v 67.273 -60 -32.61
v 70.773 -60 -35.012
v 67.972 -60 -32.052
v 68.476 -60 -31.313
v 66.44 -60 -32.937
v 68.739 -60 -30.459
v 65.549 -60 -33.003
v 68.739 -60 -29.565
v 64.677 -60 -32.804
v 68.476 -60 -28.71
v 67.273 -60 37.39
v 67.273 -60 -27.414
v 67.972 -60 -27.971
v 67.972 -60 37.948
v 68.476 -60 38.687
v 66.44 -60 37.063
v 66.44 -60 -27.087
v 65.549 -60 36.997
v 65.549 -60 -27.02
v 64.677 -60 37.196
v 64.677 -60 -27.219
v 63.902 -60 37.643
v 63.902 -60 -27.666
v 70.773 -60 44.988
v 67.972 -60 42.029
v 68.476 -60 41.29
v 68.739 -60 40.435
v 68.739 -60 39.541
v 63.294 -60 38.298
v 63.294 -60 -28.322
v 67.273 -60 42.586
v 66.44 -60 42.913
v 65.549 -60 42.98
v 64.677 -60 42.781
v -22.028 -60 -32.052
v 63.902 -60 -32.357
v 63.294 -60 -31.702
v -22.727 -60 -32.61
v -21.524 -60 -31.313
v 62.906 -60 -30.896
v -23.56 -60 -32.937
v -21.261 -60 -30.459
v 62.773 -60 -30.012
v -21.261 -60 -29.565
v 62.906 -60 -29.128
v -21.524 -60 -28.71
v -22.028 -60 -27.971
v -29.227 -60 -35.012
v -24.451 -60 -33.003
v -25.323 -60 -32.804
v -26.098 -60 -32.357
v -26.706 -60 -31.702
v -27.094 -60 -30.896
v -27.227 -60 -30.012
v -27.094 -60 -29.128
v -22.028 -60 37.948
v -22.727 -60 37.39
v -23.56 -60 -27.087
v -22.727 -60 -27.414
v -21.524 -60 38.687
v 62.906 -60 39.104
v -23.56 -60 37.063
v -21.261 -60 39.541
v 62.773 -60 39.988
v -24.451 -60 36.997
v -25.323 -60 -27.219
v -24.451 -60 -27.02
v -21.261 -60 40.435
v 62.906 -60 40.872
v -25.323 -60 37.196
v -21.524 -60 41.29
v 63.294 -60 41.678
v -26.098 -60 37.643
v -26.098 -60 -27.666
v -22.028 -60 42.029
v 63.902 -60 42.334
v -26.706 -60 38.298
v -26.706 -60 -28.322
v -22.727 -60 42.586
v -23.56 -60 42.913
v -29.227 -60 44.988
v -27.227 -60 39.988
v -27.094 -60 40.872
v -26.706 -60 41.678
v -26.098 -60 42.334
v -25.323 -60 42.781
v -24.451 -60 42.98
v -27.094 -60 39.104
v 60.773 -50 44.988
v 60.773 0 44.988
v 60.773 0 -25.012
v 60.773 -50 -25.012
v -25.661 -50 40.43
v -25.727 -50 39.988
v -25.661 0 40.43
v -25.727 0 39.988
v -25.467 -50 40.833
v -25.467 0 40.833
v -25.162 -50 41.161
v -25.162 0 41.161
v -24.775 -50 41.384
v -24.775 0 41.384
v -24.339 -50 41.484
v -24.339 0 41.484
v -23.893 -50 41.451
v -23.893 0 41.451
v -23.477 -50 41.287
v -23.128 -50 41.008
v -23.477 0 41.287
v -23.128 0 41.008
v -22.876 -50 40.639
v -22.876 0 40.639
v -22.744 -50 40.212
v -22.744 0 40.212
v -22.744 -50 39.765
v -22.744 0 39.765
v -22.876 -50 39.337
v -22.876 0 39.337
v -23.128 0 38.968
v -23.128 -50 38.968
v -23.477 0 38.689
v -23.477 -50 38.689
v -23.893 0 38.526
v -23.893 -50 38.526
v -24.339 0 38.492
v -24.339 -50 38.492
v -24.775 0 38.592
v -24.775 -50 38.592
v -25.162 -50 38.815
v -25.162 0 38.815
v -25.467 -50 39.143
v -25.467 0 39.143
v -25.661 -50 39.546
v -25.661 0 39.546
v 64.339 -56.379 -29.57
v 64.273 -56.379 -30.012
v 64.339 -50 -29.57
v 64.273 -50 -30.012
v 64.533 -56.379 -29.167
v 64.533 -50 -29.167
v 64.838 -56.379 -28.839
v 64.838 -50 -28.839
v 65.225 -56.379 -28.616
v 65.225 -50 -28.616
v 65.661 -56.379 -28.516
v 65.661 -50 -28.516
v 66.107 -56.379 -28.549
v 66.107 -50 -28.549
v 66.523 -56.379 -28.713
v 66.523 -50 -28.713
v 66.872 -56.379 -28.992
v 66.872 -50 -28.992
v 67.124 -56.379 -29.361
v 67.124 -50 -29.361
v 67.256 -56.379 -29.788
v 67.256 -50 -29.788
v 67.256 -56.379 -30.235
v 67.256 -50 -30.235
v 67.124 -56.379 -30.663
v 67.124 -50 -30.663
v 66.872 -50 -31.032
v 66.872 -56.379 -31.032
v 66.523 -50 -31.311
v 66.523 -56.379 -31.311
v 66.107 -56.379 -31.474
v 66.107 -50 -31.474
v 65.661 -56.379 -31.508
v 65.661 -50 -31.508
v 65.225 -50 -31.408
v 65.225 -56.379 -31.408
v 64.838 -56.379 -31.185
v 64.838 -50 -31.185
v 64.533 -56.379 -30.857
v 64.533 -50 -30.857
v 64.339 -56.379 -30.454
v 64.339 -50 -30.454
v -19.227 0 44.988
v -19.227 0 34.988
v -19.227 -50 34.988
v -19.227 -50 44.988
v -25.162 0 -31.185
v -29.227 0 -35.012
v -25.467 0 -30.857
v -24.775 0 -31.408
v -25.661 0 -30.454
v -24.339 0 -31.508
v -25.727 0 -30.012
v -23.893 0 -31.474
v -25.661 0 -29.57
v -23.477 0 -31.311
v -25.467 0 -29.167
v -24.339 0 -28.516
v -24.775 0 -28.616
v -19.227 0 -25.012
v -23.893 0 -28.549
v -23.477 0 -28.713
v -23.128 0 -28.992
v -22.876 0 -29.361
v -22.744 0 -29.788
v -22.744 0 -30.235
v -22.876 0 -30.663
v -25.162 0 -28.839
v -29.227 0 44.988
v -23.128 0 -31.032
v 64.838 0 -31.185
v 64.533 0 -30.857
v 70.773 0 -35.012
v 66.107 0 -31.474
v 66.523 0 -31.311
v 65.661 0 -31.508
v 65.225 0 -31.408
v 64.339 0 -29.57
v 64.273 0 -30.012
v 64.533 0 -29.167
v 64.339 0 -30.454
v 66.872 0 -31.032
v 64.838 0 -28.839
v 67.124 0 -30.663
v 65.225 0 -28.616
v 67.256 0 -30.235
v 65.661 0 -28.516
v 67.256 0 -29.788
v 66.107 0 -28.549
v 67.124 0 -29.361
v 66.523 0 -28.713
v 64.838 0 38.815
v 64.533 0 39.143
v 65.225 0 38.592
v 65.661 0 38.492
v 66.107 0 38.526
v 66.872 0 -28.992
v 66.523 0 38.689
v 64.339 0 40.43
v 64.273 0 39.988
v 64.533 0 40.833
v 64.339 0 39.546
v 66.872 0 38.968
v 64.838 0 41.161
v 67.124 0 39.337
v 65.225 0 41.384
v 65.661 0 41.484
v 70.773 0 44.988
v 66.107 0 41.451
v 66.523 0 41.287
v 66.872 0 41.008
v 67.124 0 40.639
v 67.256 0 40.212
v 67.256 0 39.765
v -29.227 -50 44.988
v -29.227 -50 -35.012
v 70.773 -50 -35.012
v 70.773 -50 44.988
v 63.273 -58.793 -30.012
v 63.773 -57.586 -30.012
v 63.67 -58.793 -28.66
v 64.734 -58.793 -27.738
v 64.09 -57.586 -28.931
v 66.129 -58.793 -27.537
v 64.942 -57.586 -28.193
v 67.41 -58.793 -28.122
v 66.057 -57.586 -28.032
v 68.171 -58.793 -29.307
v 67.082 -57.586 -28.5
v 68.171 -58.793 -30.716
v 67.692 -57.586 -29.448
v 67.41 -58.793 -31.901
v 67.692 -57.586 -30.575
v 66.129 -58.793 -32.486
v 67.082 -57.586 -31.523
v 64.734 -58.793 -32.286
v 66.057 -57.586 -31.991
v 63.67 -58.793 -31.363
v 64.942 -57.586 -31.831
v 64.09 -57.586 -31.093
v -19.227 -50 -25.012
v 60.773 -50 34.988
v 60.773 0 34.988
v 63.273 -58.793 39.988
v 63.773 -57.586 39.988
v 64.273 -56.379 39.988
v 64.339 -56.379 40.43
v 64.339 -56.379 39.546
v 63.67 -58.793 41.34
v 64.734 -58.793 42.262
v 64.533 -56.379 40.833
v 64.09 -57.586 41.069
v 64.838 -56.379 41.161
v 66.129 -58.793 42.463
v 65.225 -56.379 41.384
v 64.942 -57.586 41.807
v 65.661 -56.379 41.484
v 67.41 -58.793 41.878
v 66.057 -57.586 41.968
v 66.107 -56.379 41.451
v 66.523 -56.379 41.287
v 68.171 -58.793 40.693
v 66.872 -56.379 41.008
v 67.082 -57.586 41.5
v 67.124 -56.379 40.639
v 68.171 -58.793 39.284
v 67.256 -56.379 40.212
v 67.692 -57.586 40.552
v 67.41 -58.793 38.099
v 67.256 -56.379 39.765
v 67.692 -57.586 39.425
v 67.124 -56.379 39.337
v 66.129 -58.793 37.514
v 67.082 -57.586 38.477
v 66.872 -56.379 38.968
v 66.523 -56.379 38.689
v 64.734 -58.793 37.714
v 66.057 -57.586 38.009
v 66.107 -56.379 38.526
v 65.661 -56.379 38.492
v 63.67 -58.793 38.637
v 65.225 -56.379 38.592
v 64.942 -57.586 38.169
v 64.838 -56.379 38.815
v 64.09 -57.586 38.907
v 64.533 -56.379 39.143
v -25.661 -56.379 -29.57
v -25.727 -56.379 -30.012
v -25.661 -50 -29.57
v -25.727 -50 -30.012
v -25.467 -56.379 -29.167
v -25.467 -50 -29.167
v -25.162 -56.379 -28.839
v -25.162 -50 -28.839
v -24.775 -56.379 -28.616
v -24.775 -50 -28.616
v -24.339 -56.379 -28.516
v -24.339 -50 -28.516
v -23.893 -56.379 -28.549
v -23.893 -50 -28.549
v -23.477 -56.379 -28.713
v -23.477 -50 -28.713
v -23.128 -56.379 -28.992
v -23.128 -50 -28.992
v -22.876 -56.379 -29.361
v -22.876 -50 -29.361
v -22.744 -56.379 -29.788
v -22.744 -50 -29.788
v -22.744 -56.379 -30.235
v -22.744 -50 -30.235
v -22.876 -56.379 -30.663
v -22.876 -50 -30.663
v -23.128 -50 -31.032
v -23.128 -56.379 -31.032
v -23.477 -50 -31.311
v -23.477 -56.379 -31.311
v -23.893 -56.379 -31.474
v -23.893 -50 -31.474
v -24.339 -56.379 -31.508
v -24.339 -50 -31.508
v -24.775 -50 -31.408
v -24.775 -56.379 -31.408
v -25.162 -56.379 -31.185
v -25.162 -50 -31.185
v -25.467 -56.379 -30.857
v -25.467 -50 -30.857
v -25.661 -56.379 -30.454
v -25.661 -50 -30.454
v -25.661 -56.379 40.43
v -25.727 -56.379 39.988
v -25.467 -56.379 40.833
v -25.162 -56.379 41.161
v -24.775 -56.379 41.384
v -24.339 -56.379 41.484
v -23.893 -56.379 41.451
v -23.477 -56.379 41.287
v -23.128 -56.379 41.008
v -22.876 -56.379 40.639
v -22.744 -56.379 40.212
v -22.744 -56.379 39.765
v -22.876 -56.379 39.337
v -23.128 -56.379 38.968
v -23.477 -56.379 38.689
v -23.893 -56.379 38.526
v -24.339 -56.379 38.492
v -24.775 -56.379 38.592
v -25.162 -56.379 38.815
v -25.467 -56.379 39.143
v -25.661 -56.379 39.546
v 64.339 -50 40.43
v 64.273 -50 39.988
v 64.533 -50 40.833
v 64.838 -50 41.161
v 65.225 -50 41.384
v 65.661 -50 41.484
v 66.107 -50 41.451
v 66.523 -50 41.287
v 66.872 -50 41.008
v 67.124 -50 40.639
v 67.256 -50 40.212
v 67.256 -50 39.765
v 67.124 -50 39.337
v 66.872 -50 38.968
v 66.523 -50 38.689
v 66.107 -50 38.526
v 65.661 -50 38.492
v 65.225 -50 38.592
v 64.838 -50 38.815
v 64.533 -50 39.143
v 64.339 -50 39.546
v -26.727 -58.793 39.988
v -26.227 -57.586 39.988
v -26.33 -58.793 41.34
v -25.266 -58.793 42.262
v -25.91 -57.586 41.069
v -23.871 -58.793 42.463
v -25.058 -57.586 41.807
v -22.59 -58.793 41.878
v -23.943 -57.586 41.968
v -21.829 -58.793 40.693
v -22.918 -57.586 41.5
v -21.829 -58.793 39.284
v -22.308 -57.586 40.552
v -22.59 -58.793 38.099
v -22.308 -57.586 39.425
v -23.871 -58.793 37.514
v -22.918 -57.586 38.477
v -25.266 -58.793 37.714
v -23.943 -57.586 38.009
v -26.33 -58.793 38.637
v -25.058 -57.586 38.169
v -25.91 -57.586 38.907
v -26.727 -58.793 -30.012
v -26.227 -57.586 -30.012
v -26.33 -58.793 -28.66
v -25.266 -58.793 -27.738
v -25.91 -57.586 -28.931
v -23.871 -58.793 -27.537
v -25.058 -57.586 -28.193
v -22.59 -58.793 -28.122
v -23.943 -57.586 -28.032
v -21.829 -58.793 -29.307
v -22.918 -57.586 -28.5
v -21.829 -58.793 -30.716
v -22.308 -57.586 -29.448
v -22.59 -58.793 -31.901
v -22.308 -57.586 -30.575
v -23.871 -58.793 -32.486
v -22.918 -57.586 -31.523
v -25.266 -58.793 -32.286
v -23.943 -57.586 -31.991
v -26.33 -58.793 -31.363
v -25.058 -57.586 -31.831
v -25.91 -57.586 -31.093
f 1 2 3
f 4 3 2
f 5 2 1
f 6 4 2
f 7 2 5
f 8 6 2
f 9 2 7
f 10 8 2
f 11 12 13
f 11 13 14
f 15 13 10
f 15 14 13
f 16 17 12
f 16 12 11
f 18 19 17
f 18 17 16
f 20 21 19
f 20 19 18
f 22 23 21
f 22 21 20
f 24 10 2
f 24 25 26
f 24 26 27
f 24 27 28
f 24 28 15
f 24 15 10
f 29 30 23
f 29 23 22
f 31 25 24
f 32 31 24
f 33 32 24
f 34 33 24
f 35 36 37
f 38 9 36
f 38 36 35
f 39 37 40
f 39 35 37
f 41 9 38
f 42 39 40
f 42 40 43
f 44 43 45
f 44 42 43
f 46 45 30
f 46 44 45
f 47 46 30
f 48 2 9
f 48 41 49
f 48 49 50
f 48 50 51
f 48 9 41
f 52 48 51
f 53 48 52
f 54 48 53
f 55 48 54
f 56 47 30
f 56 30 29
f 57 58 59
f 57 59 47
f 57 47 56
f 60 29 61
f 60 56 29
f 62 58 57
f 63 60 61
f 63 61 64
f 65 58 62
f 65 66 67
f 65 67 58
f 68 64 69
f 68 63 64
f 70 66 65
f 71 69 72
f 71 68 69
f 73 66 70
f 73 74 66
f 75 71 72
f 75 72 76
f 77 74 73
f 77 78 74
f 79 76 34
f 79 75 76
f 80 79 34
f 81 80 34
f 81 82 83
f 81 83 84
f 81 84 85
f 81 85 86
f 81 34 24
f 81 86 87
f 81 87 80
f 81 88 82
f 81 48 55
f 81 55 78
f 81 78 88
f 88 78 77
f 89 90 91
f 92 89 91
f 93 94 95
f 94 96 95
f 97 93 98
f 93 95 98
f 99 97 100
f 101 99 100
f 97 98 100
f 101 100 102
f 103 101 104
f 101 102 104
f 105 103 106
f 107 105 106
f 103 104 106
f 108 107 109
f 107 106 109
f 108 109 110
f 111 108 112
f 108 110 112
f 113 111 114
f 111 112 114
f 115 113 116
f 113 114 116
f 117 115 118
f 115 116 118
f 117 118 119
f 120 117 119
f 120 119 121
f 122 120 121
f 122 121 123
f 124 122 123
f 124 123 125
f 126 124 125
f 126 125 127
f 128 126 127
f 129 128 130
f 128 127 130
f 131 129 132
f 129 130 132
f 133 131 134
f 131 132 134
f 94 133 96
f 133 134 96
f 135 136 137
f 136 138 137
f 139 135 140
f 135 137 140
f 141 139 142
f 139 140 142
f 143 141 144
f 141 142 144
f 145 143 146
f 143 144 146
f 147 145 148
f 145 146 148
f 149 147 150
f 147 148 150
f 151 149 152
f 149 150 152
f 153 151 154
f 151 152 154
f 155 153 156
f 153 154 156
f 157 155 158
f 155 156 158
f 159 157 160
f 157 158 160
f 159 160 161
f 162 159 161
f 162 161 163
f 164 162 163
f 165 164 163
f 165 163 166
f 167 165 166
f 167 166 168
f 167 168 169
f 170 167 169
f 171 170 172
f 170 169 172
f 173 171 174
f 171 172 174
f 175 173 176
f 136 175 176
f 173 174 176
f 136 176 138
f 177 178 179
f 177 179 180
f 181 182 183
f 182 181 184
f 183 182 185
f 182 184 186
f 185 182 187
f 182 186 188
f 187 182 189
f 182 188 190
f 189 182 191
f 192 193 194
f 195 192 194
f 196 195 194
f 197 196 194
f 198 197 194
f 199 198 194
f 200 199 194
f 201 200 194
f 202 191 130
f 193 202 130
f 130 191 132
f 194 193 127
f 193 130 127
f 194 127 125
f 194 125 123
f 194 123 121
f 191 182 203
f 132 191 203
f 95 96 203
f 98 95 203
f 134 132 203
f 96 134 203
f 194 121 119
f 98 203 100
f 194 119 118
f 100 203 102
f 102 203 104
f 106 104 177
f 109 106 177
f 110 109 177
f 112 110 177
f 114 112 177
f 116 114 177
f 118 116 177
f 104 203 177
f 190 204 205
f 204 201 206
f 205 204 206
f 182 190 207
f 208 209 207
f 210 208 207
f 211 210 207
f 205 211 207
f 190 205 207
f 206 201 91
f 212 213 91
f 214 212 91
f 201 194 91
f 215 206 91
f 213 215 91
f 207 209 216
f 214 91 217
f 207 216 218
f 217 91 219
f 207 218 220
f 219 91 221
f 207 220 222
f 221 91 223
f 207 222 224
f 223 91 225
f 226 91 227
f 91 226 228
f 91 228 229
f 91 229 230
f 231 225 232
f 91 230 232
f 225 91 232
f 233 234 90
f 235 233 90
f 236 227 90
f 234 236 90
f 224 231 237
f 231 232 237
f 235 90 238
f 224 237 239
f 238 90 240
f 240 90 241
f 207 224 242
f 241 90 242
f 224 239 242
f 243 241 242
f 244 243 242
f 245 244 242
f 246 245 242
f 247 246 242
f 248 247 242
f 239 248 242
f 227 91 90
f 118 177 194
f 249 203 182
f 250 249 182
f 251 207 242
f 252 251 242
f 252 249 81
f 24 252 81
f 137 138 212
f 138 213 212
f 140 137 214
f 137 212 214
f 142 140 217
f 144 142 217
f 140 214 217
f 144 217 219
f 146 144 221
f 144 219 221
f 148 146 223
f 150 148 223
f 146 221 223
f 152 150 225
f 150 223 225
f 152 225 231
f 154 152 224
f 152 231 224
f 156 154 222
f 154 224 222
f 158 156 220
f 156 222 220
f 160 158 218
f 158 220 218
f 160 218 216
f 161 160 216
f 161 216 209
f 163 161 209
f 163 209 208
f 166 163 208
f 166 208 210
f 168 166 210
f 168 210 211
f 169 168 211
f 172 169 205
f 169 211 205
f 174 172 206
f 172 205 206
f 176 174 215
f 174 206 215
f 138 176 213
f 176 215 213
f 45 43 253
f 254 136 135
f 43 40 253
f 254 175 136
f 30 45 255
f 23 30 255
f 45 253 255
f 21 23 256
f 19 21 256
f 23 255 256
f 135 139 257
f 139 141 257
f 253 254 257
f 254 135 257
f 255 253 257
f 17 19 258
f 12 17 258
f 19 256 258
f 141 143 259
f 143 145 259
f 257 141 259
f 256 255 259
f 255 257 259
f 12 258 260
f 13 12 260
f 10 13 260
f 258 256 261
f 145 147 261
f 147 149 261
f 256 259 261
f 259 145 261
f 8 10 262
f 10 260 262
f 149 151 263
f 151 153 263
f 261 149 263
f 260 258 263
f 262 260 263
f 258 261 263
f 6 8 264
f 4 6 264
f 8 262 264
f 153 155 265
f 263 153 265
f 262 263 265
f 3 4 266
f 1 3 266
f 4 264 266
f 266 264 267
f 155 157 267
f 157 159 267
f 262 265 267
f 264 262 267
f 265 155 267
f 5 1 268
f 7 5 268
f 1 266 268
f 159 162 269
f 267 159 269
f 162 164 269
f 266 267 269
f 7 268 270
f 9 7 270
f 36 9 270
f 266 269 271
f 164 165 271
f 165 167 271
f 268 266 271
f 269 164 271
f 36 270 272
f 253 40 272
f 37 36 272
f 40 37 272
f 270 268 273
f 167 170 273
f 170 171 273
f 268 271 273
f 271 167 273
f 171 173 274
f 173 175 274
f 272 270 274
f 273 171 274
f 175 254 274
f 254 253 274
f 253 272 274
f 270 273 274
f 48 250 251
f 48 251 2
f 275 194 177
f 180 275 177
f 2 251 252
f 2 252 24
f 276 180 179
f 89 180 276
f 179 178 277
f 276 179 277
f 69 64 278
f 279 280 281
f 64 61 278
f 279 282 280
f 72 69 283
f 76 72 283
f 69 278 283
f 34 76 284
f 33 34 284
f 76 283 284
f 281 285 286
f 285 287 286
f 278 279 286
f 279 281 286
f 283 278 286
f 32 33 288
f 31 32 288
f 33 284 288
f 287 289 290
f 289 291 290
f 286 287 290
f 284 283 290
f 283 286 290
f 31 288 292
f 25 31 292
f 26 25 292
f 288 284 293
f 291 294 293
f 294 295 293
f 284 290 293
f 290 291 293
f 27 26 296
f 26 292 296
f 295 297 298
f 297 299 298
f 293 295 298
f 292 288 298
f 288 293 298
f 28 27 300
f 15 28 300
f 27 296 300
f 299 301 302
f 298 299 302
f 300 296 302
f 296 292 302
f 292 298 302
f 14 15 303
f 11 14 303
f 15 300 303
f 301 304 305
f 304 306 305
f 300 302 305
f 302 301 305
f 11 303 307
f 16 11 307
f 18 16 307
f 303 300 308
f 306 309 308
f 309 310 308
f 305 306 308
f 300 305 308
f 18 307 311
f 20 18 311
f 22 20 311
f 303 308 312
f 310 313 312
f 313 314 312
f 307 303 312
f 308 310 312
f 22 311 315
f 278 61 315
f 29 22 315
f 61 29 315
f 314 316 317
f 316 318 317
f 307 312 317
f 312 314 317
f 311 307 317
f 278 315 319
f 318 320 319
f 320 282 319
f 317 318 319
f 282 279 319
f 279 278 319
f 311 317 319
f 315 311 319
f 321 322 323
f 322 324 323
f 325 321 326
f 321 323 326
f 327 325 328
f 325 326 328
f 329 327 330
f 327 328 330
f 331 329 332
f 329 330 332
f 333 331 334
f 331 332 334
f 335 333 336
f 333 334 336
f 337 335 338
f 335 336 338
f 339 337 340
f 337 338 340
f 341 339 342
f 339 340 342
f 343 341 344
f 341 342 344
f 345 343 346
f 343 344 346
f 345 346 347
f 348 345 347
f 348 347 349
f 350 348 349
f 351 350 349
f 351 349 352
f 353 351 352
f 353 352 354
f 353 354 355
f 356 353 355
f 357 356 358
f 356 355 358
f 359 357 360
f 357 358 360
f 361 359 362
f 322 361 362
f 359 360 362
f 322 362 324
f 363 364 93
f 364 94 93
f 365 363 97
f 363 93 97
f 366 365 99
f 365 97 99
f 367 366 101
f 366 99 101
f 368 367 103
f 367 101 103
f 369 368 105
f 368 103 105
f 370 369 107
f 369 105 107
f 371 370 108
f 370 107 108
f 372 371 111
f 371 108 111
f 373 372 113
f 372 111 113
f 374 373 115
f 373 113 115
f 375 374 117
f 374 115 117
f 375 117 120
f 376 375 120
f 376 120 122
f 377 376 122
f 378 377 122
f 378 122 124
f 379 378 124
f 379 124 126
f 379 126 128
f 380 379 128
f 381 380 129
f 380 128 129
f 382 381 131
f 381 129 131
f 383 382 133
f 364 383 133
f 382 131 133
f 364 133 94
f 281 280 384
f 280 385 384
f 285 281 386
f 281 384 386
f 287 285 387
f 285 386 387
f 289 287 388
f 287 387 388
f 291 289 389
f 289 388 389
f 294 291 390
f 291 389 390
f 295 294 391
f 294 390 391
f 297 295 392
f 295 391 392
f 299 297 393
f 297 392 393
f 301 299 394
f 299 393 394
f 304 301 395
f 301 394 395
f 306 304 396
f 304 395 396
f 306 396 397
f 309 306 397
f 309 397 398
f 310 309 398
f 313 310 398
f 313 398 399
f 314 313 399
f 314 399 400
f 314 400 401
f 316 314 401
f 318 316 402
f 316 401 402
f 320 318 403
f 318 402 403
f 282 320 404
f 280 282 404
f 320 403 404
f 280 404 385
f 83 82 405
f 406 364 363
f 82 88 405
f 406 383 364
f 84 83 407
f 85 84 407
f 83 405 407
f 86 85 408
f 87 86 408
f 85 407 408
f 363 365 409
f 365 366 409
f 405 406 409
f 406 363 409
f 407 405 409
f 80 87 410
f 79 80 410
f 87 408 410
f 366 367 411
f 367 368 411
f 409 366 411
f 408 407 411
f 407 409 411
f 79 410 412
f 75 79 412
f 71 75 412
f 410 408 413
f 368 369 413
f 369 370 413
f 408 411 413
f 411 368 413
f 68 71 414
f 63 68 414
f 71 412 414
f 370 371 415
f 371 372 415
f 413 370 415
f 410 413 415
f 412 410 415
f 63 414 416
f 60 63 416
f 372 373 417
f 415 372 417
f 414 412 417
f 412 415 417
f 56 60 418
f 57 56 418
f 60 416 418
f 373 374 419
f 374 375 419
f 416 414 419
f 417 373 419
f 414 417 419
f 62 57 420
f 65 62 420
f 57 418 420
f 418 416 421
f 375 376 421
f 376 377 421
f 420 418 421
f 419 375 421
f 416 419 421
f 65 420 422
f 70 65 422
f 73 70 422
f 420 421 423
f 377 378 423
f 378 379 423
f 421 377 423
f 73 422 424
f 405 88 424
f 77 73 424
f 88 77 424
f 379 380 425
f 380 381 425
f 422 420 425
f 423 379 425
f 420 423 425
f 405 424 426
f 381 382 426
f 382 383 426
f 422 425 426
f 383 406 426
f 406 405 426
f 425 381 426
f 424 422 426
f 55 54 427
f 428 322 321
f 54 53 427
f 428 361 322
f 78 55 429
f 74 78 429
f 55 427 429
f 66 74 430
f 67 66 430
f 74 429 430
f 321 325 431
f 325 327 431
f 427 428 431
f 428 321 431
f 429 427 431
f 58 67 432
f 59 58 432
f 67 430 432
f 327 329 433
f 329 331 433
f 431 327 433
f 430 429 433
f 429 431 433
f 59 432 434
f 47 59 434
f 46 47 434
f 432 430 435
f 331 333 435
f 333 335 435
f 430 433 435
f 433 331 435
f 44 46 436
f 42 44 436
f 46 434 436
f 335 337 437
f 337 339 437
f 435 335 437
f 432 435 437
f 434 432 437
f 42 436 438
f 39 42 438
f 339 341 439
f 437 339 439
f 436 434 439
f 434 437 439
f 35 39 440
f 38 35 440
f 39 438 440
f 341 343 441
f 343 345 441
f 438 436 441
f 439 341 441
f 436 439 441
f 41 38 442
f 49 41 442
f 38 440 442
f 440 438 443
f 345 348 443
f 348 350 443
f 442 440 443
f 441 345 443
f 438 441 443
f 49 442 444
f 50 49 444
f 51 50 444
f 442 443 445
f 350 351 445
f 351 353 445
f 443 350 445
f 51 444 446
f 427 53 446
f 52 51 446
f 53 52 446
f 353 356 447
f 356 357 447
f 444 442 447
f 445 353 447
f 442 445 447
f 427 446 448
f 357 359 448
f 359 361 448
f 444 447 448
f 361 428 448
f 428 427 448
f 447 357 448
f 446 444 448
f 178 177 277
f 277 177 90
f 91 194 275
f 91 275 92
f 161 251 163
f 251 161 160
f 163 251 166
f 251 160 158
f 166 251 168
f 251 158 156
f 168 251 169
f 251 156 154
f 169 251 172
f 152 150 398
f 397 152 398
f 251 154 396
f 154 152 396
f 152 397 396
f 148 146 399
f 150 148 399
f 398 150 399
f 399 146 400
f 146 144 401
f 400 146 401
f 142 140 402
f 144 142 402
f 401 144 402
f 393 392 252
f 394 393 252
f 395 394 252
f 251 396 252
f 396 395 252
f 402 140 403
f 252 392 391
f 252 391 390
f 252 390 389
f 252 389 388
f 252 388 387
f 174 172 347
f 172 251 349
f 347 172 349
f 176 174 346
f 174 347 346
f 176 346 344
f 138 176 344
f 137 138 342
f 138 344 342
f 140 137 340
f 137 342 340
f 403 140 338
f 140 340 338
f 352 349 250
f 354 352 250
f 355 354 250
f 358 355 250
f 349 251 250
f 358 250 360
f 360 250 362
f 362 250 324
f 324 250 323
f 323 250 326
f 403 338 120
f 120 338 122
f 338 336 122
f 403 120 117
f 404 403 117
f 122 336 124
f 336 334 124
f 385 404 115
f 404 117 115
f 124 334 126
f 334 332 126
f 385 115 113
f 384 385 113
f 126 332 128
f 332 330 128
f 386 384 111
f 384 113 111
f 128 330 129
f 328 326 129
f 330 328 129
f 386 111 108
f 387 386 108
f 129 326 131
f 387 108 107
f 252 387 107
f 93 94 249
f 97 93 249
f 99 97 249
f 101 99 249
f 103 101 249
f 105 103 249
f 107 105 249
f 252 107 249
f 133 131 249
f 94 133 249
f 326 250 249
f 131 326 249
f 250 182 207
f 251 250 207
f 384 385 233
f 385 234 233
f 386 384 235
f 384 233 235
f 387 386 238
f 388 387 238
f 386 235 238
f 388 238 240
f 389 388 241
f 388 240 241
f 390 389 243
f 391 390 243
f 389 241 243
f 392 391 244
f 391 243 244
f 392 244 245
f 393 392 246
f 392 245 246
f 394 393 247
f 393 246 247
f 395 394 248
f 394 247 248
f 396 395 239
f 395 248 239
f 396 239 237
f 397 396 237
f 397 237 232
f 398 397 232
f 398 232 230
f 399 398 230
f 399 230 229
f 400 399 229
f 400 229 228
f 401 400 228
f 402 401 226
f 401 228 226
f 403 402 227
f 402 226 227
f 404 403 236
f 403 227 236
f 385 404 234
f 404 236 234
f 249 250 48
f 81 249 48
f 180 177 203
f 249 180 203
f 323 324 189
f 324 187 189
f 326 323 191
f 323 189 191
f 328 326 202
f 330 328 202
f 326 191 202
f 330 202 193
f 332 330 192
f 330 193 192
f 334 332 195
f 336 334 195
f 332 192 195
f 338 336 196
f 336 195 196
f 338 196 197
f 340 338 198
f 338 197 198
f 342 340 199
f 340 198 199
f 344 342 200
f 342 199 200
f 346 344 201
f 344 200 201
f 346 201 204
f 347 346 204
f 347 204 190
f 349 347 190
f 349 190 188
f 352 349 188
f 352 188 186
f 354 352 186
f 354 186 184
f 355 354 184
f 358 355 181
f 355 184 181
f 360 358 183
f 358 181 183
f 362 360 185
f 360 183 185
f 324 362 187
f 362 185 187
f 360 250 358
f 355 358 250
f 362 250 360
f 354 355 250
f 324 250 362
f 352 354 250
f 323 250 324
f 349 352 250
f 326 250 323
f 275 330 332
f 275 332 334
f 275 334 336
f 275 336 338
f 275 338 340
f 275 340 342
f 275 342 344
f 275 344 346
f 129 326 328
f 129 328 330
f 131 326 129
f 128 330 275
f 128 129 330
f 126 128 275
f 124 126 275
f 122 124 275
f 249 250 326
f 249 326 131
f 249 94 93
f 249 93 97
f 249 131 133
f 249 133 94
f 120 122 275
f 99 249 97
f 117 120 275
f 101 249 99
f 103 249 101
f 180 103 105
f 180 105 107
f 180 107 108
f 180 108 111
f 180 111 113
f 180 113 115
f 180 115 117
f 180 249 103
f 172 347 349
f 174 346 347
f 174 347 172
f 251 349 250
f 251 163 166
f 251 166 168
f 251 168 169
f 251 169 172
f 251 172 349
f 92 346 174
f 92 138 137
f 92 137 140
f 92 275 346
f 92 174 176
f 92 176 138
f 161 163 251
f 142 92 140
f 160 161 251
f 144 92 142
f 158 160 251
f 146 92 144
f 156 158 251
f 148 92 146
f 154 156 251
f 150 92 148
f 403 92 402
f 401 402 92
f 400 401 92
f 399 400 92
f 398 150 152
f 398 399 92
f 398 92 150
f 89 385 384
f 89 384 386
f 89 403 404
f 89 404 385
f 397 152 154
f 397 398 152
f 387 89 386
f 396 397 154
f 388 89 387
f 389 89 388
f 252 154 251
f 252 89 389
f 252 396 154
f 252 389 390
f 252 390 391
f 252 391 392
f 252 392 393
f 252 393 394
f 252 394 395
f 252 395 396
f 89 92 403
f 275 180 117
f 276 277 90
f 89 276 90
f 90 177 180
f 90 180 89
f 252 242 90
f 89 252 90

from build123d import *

# Parameters (mm, degrees)
F0_W             = 80
F0_H             = 10
F4_DEPTH         = 50
F2_W             = 80
F2_H             = 10
F5_W             = 10
F5_H             = 80
F6_DEPTH         = 100
F8_D             = 3
F8_CSINK_D       = 6
F8_CSINK_ANGLE   = 45
F8_2_D           = 3
F8_2_CSINK_D     = 6
F8_2_CSINK_ANGLE = 45


with BuildPart() as f4:
    # F0 (on Front) → F4 (new body)
    with BuildSketch(Plane.XZ):
        Polygon((-19.2272488975, 34.9881720543), (-19.2272488975, 44.9881720543), (-29.2272488975, 44.9881720543), (-29.2272488975, -35.0118279457), (-19.2272488975, -35.0118279457), (-19.2272488975, -25.0118279457), align=None)
        Polygon((70.7727511025, 44.9881720543), (60.7727511025, 44.9881720543), (60.7727511025, 34.9881720543), (60.7727511025, -25.0118279457), (60.7727511025, -35.0118279457), (70.7727511025, -35.0118279457), align=None)
        with Locations((20.7727511025, -30.0118279457)):
            Rectangle(F0_W, F0_H)
    extrude(amount=F4_DEPTH)

    # F8 (through all)
    with Locations(Plane.XZ.offset(60)):
        with Locations((-24.2272488975, 39.9881720543), (65.7727511025, 39.9881720543), (65.7727511025, -30.0118279457), (-24.2272488975, -30.0118279457)):
            CounterSinkHole(F8_D / 2, F8_CSINK_D / 2, counter_sink_angle=F8_CSINK_ANGLE)


with BuildPart() as f4b:
    # F2 (on face) → F4, piece 2 (new body)
    with BuildSketch(Plane.XZ):
        with Locations((20.7727511025, 39.9881720543)):
            Rectangle(F2_W, F2_H)
    extrude(amount=F4_DEPTH)


with BuildPart() as f6:
    # F5 (on face) → F6 (new body)
    with BuildSketch(Plane(origin=(-29.2272488975, 0, 0), x_dir=(0, -1, 0), z_dir=(-1, 0, 0))):
        with Locations((55, 4.9881720543)):
            Rectangle(F5_W, F5_H)
    extrude(amount=-F6_DEPTH)

    # F8#2 (through all)
    with Locations(Plane.XZ.offset(60)):
        with Locations((-24.2272488975, 39.9881720543), (65.7727511025, 39.9881720543), (65.7727511025, -30.0118279457), (-24.2272488975, -30.0118279457)):
            CounterSinkHole(F8_2_D / 2, F8_2_CSINK_D / 2, counter_sink_angle=F8_2_CSINK_ANGLE)


solid = Compound([f4.part, f4b.part, f6.part])
